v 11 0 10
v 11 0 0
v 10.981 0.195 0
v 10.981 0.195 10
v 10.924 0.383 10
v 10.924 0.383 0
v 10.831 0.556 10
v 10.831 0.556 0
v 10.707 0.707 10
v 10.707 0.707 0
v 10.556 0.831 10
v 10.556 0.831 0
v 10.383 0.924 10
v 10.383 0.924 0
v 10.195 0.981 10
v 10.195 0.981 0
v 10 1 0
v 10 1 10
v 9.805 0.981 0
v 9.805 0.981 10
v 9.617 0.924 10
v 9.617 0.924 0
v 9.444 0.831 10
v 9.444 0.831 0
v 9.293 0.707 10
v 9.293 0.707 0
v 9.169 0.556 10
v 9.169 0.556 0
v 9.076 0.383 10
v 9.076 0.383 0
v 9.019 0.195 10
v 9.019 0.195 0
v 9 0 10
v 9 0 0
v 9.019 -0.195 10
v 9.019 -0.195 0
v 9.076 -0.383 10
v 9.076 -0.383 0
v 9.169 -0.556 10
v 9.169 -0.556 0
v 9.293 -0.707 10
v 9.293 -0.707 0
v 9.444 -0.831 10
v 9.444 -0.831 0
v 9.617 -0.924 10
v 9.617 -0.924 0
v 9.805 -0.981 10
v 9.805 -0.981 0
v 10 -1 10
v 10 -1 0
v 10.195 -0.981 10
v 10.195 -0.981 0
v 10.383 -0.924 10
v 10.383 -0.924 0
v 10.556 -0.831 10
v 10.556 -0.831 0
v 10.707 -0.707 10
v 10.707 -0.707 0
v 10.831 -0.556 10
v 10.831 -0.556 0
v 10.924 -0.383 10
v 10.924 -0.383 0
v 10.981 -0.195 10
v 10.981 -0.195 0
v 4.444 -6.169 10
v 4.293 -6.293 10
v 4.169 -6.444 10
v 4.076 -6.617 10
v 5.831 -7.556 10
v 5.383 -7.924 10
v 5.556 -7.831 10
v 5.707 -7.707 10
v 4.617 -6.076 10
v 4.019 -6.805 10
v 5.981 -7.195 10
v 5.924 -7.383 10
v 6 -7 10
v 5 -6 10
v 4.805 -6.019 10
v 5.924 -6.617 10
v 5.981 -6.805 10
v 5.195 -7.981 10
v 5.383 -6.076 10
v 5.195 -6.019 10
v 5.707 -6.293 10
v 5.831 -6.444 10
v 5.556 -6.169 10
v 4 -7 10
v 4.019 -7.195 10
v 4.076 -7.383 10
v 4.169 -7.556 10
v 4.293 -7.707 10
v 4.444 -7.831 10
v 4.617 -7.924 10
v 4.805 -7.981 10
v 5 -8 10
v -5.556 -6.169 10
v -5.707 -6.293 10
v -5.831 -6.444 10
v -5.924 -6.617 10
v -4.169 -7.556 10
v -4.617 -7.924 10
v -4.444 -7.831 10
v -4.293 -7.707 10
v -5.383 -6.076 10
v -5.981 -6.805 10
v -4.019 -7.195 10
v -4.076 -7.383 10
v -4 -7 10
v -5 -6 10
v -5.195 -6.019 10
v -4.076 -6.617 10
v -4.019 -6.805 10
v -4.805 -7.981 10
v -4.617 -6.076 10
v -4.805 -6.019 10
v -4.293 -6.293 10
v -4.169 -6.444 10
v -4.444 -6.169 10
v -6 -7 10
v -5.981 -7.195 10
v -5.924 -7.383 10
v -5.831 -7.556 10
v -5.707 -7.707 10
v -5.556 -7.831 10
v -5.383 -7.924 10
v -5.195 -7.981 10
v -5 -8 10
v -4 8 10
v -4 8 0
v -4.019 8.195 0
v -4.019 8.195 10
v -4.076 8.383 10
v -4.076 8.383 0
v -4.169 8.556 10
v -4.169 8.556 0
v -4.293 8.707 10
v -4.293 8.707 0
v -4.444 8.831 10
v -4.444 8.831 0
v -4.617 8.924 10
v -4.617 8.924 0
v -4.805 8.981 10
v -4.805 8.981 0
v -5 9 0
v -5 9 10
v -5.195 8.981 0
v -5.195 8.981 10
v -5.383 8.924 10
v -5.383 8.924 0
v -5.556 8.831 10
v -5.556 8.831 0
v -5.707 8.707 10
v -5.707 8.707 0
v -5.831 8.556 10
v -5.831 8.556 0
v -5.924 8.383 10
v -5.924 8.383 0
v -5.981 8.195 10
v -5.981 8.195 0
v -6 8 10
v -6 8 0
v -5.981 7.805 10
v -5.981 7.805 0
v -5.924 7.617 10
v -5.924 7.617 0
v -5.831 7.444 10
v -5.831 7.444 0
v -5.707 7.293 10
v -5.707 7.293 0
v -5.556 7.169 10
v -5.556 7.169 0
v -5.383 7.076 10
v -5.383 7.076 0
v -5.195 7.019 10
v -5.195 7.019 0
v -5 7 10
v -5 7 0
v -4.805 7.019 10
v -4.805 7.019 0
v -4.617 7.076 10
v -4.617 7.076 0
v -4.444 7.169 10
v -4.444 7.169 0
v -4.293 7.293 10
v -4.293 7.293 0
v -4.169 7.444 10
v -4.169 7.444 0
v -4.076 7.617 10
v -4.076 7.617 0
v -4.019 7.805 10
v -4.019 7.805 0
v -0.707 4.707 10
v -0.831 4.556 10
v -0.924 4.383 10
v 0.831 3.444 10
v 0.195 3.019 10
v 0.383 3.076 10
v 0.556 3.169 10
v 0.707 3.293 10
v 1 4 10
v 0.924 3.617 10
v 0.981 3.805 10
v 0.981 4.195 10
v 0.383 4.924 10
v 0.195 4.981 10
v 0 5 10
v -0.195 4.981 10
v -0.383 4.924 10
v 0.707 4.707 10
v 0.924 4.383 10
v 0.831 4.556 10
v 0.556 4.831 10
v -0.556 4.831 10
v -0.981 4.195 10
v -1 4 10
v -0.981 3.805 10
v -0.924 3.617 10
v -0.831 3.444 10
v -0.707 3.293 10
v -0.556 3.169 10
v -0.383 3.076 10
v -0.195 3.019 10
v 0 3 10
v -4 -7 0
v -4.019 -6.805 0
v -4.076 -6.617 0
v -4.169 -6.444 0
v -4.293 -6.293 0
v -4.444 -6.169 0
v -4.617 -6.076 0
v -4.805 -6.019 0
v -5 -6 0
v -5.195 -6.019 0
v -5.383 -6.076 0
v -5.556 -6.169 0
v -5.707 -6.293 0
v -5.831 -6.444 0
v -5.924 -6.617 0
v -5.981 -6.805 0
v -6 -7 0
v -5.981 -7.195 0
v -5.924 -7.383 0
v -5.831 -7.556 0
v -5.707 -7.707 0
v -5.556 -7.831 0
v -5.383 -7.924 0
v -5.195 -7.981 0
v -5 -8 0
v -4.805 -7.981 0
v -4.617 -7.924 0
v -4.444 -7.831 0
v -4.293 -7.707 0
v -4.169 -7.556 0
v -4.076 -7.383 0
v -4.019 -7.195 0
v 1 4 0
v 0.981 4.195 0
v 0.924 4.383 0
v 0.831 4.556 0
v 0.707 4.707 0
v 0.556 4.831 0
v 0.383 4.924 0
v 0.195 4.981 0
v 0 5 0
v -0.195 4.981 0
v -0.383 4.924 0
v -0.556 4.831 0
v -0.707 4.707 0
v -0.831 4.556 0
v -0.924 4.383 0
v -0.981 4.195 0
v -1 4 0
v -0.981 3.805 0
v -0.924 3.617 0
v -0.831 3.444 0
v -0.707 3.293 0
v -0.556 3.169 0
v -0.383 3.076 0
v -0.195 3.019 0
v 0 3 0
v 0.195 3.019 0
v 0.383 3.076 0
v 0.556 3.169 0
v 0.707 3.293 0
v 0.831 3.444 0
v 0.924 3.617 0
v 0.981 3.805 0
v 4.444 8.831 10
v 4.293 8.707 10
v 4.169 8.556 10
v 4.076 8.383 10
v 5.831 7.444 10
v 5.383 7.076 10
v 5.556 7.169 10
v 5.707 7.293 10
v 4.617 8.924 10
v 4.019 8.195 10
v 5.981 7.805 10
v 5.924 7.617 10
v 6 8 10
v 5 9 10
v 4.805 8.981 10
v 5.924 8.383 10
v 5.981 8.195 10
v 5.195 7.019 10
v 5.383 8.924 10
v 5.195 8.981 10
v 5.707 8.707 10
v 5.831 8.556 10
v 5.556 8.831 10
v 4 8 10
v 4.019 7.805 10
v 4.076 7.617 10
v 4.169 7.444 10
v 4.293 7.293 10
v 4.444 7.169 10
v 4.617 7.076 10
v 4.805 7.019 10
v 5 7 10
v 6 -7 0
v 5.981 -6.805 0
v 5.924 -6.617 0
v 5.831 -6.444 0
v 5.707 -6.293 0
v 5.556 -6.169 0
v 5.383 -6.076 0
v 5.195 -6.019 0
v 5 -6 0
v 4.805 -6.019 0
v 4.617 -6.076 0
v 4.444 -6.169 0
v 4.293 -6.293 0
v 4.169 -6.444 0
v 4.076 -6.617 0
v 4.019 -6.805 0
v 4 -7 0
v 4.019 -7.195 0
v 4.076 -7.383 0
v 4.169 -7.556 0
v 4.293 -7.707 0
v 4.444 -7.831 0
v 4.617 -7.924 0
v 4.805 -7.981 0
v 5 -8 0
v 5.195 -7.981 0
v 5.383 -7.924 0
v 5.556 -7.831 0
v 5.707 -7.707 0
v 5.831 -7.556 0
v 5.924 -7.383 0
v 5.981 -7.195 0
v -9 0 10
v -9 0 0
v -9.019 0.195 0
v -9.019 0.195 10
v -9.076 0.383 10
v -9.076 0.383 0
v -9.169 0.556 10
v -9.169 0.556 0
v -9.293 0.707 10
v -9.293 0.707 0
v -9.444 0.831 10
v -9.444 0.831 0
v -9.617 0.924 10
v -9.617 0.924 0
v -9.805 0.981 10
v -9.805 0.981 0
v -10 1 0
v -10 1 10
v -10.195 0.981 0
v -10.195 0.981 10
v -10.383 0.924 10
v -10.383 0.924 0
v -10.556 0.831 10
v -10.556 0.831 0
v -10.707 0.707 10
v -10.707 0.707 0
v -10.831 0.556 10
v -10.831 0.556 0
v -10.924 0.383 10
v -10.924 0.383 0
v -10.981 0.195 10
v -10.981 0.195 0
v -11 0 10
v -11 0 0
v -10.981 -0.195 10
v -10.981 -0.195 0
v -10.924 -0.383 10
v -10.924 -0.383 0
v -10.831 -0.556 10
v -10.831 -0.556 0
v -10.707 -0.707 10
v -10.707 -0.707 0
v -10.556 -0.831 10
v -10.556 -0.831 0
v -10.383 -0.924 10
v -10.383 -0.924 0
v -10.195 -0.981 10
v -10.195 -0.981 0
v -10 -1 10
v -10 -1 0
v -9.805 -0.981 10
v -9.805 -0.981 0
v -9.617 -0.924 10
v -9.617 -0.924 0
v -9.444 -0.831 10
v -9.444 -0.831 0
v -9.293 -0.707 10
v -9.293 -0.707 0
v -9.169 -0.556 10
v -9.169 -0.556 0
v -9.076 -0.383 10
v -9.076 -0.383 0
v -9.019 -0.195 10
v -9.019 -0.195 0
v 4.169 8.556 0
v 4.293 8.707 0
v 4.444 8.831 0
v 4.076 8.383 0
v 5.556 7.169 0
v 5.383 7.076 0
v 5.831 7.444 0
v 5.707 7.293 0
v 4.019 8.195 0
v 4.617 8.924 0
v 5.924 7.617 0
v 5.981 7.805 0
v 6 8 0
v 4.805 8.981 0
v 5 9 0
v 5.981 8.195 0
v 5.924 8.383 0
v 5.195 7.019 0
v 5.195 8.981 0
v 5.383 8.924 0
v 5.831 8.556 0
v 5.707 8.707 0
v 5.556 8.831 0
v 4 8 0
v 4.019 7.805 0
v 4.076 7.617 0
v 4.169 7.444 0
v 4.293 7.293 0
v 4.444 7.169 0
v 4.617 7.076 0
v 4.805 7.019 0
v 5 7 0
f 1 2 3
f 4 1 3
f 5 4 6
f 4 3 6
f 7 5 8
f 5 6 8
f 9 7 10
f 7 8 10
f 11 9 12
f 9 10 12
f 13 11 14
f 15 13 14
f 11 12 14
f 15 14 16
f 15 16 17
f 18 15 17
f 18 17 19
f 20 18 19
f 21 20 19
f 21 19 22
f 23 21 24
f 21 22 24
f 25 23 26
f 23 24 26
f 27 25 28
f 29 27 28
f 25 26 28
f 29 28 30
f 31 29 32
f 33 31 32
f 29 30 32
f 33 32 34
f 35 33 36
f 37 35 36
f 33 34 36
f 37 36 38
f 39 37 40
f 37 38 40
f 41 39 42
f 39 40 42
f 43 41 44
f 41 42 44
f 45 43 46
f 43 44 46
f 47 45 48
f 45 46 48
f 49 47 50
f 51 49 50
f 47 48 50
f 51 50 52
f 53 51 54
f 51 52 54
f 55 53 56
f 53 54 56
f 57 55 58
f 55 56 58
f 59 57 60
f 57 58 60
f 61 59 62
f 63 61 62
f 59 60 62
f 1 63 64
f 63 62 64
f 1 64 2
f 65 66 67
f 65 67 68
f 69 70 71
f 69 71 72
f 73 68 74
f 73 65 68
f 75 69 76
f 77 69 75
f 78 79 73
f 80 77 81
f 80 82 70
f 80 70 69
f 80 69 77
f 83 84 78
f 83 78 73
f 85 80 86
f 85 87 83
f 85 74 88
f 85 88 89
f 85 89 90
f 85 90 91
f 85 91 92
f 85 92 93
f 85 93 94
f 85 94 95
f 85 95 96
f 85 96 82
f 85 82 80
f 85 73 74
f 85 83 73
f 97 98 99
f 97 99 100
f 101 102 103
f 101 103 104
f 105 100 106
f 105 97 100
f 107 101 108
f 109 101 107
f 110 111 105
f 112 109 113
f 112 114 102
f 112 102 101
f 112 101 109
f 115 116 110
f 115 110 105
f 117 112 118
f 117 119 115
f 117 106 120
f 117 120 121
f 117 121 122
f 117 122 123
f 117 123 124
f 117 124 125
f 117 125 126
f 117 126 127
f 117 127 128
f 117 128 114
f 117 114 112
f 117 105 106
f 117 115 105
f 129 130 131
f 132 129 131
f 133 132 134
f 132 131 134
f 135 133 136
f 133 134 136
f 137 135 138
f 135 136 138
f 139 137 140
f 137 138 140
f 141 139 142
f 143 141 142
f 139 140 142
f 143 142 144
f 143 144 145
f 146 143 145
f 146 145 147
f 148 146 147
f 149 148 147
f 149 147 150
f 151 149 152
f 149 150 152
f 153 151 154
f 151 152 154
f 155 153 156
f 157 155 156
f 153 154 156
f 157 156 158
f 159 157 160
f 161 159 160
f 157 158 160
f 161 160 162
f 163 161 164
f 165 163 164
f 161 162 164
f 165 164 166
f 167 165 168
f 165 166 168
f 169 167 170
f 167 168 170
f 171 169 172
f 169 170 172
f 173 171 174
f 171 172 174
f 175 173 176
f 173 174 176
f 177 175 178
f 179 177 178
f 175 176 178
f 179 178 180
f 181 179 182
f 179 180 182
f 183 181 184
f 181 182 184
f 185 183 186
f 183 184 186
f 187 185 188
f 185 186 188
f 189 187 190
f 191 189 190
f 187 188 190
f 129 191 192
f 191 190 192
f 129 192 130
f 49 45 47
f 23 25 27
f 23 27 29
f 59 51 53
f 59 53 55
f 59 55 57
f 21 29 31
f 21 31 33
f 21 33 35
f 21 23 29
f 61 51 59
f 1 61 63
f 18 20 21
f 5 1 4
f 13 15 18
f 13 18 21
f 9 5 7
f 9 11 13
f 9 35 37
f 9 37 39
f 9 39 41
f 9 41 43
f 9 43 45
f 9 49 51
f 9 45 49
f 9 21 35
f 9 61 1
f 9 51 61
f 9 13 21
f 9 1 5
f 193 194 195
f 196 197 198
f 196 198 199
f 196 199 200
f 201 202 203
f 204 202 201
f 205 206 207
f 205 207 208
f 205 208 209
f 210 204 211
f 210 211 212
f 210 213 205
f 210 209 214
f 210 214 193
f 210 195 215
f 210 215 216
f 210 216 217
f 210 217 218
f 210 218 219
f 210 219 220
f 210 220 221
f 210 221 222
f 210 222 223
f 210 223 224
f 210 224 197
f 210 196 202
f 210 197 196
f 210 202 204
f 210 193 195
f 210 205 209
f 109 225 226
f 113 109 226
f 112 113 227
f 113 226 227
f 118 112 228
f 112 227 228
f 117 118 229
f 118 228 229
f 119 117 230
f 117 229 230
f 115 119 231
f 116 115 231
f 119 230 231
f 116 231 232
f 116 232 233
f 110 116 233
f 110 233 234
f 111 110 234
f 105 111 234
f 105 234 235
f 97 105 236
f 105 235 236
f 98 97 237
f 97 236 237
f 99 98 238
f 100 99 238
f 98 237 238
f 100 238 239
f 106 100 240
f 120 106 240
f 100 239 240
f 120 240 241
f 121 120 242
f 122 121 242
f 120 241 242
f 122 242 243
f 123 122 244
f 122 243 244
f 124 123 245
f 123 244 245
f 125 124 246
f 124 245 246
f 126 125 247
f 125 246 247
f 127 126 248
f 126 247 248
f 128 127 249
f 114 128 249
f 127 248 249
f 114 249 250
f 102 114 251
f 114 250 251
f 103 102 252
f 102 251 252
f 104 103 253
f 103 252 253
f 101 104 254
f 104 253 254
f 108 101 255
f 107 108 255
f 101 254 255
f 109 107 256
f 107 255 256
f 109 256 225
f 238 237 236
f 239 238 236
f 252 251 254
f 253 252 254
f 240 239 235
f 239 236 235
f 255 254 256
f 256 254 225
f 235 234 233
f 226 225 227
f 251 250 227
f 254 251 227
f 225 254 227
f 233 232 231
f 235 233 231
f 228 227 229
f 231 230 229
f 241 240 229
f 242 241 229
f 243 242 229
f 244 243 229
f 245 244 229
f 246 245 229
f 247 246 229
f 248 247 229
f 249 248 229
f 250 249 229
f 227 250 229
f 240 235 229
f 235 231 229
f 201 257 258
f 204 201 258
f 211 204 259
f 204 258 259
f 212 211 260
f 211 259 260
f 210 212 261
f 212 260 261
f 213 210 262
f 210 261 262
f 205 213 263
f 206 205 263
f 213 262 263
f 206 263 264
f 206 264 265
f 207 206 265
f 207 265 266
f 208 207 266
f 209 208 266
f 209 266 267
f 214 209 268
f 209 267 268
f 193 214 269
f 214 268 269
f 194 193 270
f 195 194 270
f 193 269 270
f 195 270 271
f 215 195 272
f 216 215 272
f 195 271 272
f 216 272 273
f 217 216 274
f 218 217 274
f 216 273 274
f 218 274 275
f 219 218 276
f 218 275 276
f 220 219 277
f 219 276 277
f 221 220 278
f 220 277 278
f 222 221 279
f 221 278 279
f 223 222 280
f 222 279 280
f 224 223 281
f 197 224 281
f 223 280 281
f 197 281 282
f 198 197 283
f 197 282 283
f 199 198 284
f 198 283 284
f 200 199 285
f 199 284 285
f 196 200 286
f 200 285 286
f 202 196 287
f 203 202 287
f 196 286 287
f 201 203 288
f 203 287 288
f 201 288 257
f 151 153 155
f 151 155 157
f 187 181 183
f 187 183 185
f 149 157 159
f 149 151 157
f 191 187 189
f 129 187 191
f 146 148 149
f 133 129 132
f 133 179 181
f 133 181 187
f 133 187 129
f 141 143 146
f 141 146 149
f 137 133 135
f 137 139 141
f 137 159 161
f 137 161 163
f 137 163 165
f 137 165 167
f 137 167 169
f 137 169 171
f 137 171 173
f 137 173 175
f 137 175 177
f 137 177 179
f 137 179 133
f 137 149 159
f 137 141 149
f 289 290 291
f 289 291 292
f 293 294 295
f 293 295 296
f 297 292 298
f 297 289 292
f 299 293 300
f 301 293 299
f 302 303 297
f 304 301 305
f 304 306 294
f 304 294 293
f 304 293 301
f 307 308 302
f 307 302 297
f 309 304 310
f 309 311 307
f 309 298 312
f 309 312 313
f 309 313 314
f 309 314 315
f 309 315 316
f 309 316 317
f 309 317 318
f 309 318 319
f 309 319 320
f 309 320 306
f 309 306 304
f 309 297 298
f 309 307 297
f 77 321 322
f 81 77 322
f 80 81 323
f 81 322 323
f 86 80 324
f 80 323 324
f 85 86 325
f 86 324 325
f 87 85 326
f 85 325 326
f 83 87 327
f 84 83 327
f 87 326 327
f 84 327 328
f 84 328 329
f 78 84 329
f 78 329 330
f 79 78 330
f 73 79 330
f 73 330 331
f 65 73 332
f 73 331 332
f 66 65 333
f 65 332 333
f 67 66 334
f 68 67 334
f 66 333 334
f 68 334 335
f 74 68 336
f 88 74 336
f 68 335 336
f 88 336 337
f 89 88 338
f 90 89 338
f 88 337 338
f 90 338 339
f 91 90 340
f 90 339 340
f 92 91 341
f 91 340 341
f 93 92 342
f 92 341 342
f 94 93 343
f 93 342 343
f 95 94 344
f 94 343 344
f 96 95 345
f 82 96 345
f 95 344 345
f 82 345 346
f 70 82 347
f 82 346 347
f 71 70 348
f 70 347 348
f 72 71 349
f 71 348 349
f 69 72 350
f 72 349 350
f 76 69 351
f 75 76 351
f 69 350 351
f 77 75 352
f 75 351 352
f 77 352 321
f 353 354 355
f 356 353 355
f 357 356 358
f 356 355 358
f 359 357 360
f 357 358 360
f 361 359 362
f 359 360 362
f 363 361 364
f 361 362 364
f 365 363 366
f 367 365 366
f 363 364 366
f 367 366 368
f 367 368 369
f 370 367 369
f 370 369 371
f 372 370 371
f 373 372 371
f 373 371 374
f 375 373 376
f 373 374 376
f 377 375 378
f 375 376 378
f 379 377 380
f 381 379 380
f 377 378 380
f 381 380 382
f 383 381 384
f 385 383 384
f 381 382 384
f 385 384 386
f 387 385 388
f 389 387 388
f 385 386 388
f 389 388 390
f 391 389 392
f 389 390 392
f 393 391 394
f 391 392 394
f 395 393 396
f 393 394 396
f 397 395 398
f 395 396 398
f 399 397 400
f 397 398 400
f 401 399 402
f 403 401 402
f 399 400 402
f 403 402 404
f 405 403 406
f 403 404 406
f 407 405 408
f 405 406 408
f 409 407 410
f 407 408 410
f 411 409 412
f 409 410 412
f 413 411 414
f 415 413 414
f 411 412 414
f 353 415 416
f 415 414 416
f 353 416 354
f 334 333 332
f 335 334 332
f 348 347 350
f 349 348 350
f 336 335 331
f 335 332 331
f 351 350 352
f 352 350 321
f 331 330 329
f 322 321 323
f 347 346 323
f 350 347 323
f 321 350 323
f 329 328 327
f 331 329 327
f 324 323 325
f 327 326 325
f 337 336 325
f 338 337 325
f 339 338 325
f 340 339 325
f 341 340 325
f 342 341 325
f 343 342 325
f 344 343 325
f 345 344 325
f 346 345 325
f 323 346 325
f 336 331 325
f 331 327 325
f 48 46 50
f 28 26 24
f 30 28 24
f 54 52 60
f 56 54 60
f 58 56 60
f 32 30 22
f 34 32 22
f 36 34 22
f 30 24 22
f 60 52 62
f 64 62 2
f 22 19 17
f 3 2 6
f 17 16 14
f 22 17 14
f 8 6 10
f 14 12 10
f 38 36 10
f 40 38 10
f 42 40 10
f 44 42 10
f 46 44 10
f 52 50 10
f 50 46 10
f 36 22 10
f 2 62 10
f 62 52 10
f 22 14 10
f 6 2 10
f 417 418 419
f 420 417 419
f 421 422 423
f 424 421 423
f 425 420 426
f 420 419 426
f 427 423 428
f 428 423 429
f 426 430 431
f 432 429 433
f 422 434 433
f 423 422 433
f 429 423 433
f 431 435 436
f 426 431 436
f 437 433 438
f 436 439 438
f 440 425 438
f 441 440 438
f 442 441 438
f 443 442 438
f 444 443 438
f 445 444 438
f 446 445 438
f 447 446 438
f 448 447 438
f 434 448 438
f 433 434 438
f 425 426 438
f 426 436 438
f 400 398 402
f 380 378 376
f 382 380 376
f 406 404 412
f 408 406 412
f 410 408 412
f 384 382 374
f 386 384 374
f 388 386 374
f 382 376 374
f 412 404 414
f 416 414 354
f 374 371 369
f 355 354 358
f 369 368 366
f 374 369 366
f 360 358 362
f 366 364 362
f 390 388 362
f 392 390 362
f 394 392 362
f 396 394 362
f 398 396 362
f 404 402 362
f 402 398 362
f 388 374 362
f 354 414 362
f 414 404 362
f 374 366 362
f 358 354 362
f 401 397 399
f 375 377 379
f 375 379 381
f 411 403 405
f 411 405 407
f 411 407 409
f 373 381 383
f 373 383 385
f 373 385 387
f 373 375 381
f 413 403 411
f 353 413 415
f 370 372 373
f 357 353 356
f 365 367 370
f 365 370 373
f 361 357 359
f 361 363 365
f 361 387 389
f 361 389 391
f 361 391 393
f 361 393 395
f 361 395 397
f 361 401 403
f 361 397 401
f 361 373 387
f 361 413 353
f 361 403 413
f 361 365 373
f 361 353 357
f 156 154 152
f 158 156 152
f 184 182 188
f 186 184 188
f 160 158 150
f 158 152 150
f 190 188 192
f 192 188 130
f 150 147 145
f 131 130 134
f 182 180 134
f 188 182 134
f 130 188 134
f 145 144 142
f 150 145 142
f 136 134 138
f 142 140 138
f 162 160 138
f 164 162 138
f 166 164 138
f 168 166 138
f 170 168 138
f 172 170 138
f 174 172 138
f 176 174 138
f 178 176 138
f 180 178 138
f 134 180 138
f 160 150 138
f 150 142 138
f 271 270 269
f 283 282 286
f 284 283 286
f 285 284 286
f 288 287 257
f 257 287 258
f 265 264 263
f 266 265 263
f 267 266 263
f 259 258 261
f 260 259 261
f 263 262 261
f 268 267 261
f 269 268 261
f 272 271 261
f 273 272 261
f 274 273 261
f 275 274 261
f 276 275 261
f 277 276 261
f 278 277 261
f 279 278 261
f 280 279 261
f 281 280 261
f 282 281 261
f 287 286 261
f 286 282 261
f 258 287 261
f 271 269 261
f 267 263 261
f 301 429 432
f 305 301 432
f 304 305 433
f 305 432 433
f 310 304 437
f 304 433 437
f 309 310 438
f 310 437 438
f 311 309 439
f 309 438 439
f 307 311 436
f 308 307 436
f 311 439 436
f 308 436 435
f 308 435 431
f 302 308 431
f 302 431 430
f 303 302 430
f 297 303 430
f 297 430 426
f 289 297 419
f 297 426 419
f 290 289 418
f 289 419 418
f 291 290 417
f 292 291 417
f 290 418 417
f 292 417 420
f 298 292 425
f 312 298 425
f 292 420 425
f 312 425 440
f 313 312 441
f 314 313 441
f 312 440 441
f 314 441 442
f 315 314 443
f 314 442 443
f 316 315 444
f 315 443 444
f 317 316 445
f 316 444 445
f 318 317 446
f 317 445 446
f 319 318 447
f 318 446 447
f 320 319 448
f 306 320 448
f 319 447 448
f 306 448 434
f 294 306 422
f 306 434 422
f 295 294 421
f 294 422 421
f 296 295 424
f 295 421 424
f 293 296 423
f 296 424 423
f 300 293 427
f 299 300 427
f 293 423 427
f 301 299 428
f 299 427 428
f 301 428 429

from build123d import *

# Parameters (mm, degrees)
CYLINDER011_R     = 1
CYLINDER011_DEPTH = 10
CYLINDER010_R     = 1
CYLINDER010_DEPTH = 10
CYLINDER009_R     = 1
CYLINDER009_DEPTH = 10
CYLINDER008_R     = 1
CYLINDER008_DEPTH = 10
CYLINDER006_R     = 1
CYLINDER006_DEPTH = 10
CYLINDER007_R     = 1
CYLINDER007_DEPTH = 10
CYLINDER012_R     = 1
CYLINDER012_DEPTH = 10


with BuildPart() as threadedhole007:
    # Cylinder011 → Cylinder011 (new body)
    with BuildSketch(Plane(origin=(5, 8, 0), x_dir=(1, 0, 0), z_dir=(0, 0, 1))):
        Circle(CYLINDER011_R)
    extrude(amount=CYLINDER011_DEPTH)


with BuildPart() as threadedhole006:
    # Cylinder010 → Cylinder010 (new body)
    with BuildSketch(Plane(origin=(-5, 8, 0), x_dir=(1, 0, 0), z_dir=(0, 0, 1))):
        Circle(CYLINDER010_R)
    extrude(amount=CYLINDER010_DEPTH)


with BuildPart() as threadedhole005:
    # Cylinder009 → Cylinder009 (new body)
    with BuildSketch(Plane(origin=(-5, -7, 0), x_dir=(1, 0, 0), z_dir=(0, 0, 1))):
        Circle(CYLINDER009_R)
    extrude(amount=CYLINDER009_DEPTH)


with BuildPart() as threadedhole004:
    # Cylinder008 → Cylinder008 (new body)
    with BuildSketch(Plane(origin=(5, -7, 0), x_dir=(1, 0, 0), z_dir=(0, 0, 1))):
        Circle(CYLINDER008_R)
    extrude(amount=CYLINDER008_DEPTH)


with BuildPart() as threadedhole002:
    # Cylinder006 → Cylinder006 (new body)
    with BuildSketch(Plane(origin=(-10, 0, 0), x_dir=(1, 0, 0), z_dir=(0, 0, 1))):
        Circle(CYLINDER006_R)
    extrude(amount=CYLINDER006_DEPTH)


with BuildPart() as threadedhole003:
    # Cylinder007 → Cylinder007 (new body)
    with BuildSketch(Plane(origin=(10, 0, 0), x_dir=(1, 0, 0), z_dir=(0, 0, 1))):
        Circle(CYLINDER007_R)
    extrude(amount=CYLINDER007_DEPTH)


with BuildPart() as fusion005:
    # Cylinder012 → Cylinder012 (new body)
    with BuildSketch(Plane(origin=(0, 4, 0), x_dir=(1, 0, 0), z_dir=(0, 0, 1))):
        Circle(CYLINDER012_R)
    extrude(amount=CYLINDER012_DEPTH)

    # Fusion005: union ThreadedHole007, ThreadedHole006, ThreadedHole005, ThreadedHole004, ThreadedHole002, ThreadedHole003
    add(threadedhole007.part)
    add(threadedhole006.part)
    add(threadedhole005.part)
    add(threadedhole004.part)
    add(threadedhole002.part)
    add(threadedhole003.part)


solid = fusion005.part
